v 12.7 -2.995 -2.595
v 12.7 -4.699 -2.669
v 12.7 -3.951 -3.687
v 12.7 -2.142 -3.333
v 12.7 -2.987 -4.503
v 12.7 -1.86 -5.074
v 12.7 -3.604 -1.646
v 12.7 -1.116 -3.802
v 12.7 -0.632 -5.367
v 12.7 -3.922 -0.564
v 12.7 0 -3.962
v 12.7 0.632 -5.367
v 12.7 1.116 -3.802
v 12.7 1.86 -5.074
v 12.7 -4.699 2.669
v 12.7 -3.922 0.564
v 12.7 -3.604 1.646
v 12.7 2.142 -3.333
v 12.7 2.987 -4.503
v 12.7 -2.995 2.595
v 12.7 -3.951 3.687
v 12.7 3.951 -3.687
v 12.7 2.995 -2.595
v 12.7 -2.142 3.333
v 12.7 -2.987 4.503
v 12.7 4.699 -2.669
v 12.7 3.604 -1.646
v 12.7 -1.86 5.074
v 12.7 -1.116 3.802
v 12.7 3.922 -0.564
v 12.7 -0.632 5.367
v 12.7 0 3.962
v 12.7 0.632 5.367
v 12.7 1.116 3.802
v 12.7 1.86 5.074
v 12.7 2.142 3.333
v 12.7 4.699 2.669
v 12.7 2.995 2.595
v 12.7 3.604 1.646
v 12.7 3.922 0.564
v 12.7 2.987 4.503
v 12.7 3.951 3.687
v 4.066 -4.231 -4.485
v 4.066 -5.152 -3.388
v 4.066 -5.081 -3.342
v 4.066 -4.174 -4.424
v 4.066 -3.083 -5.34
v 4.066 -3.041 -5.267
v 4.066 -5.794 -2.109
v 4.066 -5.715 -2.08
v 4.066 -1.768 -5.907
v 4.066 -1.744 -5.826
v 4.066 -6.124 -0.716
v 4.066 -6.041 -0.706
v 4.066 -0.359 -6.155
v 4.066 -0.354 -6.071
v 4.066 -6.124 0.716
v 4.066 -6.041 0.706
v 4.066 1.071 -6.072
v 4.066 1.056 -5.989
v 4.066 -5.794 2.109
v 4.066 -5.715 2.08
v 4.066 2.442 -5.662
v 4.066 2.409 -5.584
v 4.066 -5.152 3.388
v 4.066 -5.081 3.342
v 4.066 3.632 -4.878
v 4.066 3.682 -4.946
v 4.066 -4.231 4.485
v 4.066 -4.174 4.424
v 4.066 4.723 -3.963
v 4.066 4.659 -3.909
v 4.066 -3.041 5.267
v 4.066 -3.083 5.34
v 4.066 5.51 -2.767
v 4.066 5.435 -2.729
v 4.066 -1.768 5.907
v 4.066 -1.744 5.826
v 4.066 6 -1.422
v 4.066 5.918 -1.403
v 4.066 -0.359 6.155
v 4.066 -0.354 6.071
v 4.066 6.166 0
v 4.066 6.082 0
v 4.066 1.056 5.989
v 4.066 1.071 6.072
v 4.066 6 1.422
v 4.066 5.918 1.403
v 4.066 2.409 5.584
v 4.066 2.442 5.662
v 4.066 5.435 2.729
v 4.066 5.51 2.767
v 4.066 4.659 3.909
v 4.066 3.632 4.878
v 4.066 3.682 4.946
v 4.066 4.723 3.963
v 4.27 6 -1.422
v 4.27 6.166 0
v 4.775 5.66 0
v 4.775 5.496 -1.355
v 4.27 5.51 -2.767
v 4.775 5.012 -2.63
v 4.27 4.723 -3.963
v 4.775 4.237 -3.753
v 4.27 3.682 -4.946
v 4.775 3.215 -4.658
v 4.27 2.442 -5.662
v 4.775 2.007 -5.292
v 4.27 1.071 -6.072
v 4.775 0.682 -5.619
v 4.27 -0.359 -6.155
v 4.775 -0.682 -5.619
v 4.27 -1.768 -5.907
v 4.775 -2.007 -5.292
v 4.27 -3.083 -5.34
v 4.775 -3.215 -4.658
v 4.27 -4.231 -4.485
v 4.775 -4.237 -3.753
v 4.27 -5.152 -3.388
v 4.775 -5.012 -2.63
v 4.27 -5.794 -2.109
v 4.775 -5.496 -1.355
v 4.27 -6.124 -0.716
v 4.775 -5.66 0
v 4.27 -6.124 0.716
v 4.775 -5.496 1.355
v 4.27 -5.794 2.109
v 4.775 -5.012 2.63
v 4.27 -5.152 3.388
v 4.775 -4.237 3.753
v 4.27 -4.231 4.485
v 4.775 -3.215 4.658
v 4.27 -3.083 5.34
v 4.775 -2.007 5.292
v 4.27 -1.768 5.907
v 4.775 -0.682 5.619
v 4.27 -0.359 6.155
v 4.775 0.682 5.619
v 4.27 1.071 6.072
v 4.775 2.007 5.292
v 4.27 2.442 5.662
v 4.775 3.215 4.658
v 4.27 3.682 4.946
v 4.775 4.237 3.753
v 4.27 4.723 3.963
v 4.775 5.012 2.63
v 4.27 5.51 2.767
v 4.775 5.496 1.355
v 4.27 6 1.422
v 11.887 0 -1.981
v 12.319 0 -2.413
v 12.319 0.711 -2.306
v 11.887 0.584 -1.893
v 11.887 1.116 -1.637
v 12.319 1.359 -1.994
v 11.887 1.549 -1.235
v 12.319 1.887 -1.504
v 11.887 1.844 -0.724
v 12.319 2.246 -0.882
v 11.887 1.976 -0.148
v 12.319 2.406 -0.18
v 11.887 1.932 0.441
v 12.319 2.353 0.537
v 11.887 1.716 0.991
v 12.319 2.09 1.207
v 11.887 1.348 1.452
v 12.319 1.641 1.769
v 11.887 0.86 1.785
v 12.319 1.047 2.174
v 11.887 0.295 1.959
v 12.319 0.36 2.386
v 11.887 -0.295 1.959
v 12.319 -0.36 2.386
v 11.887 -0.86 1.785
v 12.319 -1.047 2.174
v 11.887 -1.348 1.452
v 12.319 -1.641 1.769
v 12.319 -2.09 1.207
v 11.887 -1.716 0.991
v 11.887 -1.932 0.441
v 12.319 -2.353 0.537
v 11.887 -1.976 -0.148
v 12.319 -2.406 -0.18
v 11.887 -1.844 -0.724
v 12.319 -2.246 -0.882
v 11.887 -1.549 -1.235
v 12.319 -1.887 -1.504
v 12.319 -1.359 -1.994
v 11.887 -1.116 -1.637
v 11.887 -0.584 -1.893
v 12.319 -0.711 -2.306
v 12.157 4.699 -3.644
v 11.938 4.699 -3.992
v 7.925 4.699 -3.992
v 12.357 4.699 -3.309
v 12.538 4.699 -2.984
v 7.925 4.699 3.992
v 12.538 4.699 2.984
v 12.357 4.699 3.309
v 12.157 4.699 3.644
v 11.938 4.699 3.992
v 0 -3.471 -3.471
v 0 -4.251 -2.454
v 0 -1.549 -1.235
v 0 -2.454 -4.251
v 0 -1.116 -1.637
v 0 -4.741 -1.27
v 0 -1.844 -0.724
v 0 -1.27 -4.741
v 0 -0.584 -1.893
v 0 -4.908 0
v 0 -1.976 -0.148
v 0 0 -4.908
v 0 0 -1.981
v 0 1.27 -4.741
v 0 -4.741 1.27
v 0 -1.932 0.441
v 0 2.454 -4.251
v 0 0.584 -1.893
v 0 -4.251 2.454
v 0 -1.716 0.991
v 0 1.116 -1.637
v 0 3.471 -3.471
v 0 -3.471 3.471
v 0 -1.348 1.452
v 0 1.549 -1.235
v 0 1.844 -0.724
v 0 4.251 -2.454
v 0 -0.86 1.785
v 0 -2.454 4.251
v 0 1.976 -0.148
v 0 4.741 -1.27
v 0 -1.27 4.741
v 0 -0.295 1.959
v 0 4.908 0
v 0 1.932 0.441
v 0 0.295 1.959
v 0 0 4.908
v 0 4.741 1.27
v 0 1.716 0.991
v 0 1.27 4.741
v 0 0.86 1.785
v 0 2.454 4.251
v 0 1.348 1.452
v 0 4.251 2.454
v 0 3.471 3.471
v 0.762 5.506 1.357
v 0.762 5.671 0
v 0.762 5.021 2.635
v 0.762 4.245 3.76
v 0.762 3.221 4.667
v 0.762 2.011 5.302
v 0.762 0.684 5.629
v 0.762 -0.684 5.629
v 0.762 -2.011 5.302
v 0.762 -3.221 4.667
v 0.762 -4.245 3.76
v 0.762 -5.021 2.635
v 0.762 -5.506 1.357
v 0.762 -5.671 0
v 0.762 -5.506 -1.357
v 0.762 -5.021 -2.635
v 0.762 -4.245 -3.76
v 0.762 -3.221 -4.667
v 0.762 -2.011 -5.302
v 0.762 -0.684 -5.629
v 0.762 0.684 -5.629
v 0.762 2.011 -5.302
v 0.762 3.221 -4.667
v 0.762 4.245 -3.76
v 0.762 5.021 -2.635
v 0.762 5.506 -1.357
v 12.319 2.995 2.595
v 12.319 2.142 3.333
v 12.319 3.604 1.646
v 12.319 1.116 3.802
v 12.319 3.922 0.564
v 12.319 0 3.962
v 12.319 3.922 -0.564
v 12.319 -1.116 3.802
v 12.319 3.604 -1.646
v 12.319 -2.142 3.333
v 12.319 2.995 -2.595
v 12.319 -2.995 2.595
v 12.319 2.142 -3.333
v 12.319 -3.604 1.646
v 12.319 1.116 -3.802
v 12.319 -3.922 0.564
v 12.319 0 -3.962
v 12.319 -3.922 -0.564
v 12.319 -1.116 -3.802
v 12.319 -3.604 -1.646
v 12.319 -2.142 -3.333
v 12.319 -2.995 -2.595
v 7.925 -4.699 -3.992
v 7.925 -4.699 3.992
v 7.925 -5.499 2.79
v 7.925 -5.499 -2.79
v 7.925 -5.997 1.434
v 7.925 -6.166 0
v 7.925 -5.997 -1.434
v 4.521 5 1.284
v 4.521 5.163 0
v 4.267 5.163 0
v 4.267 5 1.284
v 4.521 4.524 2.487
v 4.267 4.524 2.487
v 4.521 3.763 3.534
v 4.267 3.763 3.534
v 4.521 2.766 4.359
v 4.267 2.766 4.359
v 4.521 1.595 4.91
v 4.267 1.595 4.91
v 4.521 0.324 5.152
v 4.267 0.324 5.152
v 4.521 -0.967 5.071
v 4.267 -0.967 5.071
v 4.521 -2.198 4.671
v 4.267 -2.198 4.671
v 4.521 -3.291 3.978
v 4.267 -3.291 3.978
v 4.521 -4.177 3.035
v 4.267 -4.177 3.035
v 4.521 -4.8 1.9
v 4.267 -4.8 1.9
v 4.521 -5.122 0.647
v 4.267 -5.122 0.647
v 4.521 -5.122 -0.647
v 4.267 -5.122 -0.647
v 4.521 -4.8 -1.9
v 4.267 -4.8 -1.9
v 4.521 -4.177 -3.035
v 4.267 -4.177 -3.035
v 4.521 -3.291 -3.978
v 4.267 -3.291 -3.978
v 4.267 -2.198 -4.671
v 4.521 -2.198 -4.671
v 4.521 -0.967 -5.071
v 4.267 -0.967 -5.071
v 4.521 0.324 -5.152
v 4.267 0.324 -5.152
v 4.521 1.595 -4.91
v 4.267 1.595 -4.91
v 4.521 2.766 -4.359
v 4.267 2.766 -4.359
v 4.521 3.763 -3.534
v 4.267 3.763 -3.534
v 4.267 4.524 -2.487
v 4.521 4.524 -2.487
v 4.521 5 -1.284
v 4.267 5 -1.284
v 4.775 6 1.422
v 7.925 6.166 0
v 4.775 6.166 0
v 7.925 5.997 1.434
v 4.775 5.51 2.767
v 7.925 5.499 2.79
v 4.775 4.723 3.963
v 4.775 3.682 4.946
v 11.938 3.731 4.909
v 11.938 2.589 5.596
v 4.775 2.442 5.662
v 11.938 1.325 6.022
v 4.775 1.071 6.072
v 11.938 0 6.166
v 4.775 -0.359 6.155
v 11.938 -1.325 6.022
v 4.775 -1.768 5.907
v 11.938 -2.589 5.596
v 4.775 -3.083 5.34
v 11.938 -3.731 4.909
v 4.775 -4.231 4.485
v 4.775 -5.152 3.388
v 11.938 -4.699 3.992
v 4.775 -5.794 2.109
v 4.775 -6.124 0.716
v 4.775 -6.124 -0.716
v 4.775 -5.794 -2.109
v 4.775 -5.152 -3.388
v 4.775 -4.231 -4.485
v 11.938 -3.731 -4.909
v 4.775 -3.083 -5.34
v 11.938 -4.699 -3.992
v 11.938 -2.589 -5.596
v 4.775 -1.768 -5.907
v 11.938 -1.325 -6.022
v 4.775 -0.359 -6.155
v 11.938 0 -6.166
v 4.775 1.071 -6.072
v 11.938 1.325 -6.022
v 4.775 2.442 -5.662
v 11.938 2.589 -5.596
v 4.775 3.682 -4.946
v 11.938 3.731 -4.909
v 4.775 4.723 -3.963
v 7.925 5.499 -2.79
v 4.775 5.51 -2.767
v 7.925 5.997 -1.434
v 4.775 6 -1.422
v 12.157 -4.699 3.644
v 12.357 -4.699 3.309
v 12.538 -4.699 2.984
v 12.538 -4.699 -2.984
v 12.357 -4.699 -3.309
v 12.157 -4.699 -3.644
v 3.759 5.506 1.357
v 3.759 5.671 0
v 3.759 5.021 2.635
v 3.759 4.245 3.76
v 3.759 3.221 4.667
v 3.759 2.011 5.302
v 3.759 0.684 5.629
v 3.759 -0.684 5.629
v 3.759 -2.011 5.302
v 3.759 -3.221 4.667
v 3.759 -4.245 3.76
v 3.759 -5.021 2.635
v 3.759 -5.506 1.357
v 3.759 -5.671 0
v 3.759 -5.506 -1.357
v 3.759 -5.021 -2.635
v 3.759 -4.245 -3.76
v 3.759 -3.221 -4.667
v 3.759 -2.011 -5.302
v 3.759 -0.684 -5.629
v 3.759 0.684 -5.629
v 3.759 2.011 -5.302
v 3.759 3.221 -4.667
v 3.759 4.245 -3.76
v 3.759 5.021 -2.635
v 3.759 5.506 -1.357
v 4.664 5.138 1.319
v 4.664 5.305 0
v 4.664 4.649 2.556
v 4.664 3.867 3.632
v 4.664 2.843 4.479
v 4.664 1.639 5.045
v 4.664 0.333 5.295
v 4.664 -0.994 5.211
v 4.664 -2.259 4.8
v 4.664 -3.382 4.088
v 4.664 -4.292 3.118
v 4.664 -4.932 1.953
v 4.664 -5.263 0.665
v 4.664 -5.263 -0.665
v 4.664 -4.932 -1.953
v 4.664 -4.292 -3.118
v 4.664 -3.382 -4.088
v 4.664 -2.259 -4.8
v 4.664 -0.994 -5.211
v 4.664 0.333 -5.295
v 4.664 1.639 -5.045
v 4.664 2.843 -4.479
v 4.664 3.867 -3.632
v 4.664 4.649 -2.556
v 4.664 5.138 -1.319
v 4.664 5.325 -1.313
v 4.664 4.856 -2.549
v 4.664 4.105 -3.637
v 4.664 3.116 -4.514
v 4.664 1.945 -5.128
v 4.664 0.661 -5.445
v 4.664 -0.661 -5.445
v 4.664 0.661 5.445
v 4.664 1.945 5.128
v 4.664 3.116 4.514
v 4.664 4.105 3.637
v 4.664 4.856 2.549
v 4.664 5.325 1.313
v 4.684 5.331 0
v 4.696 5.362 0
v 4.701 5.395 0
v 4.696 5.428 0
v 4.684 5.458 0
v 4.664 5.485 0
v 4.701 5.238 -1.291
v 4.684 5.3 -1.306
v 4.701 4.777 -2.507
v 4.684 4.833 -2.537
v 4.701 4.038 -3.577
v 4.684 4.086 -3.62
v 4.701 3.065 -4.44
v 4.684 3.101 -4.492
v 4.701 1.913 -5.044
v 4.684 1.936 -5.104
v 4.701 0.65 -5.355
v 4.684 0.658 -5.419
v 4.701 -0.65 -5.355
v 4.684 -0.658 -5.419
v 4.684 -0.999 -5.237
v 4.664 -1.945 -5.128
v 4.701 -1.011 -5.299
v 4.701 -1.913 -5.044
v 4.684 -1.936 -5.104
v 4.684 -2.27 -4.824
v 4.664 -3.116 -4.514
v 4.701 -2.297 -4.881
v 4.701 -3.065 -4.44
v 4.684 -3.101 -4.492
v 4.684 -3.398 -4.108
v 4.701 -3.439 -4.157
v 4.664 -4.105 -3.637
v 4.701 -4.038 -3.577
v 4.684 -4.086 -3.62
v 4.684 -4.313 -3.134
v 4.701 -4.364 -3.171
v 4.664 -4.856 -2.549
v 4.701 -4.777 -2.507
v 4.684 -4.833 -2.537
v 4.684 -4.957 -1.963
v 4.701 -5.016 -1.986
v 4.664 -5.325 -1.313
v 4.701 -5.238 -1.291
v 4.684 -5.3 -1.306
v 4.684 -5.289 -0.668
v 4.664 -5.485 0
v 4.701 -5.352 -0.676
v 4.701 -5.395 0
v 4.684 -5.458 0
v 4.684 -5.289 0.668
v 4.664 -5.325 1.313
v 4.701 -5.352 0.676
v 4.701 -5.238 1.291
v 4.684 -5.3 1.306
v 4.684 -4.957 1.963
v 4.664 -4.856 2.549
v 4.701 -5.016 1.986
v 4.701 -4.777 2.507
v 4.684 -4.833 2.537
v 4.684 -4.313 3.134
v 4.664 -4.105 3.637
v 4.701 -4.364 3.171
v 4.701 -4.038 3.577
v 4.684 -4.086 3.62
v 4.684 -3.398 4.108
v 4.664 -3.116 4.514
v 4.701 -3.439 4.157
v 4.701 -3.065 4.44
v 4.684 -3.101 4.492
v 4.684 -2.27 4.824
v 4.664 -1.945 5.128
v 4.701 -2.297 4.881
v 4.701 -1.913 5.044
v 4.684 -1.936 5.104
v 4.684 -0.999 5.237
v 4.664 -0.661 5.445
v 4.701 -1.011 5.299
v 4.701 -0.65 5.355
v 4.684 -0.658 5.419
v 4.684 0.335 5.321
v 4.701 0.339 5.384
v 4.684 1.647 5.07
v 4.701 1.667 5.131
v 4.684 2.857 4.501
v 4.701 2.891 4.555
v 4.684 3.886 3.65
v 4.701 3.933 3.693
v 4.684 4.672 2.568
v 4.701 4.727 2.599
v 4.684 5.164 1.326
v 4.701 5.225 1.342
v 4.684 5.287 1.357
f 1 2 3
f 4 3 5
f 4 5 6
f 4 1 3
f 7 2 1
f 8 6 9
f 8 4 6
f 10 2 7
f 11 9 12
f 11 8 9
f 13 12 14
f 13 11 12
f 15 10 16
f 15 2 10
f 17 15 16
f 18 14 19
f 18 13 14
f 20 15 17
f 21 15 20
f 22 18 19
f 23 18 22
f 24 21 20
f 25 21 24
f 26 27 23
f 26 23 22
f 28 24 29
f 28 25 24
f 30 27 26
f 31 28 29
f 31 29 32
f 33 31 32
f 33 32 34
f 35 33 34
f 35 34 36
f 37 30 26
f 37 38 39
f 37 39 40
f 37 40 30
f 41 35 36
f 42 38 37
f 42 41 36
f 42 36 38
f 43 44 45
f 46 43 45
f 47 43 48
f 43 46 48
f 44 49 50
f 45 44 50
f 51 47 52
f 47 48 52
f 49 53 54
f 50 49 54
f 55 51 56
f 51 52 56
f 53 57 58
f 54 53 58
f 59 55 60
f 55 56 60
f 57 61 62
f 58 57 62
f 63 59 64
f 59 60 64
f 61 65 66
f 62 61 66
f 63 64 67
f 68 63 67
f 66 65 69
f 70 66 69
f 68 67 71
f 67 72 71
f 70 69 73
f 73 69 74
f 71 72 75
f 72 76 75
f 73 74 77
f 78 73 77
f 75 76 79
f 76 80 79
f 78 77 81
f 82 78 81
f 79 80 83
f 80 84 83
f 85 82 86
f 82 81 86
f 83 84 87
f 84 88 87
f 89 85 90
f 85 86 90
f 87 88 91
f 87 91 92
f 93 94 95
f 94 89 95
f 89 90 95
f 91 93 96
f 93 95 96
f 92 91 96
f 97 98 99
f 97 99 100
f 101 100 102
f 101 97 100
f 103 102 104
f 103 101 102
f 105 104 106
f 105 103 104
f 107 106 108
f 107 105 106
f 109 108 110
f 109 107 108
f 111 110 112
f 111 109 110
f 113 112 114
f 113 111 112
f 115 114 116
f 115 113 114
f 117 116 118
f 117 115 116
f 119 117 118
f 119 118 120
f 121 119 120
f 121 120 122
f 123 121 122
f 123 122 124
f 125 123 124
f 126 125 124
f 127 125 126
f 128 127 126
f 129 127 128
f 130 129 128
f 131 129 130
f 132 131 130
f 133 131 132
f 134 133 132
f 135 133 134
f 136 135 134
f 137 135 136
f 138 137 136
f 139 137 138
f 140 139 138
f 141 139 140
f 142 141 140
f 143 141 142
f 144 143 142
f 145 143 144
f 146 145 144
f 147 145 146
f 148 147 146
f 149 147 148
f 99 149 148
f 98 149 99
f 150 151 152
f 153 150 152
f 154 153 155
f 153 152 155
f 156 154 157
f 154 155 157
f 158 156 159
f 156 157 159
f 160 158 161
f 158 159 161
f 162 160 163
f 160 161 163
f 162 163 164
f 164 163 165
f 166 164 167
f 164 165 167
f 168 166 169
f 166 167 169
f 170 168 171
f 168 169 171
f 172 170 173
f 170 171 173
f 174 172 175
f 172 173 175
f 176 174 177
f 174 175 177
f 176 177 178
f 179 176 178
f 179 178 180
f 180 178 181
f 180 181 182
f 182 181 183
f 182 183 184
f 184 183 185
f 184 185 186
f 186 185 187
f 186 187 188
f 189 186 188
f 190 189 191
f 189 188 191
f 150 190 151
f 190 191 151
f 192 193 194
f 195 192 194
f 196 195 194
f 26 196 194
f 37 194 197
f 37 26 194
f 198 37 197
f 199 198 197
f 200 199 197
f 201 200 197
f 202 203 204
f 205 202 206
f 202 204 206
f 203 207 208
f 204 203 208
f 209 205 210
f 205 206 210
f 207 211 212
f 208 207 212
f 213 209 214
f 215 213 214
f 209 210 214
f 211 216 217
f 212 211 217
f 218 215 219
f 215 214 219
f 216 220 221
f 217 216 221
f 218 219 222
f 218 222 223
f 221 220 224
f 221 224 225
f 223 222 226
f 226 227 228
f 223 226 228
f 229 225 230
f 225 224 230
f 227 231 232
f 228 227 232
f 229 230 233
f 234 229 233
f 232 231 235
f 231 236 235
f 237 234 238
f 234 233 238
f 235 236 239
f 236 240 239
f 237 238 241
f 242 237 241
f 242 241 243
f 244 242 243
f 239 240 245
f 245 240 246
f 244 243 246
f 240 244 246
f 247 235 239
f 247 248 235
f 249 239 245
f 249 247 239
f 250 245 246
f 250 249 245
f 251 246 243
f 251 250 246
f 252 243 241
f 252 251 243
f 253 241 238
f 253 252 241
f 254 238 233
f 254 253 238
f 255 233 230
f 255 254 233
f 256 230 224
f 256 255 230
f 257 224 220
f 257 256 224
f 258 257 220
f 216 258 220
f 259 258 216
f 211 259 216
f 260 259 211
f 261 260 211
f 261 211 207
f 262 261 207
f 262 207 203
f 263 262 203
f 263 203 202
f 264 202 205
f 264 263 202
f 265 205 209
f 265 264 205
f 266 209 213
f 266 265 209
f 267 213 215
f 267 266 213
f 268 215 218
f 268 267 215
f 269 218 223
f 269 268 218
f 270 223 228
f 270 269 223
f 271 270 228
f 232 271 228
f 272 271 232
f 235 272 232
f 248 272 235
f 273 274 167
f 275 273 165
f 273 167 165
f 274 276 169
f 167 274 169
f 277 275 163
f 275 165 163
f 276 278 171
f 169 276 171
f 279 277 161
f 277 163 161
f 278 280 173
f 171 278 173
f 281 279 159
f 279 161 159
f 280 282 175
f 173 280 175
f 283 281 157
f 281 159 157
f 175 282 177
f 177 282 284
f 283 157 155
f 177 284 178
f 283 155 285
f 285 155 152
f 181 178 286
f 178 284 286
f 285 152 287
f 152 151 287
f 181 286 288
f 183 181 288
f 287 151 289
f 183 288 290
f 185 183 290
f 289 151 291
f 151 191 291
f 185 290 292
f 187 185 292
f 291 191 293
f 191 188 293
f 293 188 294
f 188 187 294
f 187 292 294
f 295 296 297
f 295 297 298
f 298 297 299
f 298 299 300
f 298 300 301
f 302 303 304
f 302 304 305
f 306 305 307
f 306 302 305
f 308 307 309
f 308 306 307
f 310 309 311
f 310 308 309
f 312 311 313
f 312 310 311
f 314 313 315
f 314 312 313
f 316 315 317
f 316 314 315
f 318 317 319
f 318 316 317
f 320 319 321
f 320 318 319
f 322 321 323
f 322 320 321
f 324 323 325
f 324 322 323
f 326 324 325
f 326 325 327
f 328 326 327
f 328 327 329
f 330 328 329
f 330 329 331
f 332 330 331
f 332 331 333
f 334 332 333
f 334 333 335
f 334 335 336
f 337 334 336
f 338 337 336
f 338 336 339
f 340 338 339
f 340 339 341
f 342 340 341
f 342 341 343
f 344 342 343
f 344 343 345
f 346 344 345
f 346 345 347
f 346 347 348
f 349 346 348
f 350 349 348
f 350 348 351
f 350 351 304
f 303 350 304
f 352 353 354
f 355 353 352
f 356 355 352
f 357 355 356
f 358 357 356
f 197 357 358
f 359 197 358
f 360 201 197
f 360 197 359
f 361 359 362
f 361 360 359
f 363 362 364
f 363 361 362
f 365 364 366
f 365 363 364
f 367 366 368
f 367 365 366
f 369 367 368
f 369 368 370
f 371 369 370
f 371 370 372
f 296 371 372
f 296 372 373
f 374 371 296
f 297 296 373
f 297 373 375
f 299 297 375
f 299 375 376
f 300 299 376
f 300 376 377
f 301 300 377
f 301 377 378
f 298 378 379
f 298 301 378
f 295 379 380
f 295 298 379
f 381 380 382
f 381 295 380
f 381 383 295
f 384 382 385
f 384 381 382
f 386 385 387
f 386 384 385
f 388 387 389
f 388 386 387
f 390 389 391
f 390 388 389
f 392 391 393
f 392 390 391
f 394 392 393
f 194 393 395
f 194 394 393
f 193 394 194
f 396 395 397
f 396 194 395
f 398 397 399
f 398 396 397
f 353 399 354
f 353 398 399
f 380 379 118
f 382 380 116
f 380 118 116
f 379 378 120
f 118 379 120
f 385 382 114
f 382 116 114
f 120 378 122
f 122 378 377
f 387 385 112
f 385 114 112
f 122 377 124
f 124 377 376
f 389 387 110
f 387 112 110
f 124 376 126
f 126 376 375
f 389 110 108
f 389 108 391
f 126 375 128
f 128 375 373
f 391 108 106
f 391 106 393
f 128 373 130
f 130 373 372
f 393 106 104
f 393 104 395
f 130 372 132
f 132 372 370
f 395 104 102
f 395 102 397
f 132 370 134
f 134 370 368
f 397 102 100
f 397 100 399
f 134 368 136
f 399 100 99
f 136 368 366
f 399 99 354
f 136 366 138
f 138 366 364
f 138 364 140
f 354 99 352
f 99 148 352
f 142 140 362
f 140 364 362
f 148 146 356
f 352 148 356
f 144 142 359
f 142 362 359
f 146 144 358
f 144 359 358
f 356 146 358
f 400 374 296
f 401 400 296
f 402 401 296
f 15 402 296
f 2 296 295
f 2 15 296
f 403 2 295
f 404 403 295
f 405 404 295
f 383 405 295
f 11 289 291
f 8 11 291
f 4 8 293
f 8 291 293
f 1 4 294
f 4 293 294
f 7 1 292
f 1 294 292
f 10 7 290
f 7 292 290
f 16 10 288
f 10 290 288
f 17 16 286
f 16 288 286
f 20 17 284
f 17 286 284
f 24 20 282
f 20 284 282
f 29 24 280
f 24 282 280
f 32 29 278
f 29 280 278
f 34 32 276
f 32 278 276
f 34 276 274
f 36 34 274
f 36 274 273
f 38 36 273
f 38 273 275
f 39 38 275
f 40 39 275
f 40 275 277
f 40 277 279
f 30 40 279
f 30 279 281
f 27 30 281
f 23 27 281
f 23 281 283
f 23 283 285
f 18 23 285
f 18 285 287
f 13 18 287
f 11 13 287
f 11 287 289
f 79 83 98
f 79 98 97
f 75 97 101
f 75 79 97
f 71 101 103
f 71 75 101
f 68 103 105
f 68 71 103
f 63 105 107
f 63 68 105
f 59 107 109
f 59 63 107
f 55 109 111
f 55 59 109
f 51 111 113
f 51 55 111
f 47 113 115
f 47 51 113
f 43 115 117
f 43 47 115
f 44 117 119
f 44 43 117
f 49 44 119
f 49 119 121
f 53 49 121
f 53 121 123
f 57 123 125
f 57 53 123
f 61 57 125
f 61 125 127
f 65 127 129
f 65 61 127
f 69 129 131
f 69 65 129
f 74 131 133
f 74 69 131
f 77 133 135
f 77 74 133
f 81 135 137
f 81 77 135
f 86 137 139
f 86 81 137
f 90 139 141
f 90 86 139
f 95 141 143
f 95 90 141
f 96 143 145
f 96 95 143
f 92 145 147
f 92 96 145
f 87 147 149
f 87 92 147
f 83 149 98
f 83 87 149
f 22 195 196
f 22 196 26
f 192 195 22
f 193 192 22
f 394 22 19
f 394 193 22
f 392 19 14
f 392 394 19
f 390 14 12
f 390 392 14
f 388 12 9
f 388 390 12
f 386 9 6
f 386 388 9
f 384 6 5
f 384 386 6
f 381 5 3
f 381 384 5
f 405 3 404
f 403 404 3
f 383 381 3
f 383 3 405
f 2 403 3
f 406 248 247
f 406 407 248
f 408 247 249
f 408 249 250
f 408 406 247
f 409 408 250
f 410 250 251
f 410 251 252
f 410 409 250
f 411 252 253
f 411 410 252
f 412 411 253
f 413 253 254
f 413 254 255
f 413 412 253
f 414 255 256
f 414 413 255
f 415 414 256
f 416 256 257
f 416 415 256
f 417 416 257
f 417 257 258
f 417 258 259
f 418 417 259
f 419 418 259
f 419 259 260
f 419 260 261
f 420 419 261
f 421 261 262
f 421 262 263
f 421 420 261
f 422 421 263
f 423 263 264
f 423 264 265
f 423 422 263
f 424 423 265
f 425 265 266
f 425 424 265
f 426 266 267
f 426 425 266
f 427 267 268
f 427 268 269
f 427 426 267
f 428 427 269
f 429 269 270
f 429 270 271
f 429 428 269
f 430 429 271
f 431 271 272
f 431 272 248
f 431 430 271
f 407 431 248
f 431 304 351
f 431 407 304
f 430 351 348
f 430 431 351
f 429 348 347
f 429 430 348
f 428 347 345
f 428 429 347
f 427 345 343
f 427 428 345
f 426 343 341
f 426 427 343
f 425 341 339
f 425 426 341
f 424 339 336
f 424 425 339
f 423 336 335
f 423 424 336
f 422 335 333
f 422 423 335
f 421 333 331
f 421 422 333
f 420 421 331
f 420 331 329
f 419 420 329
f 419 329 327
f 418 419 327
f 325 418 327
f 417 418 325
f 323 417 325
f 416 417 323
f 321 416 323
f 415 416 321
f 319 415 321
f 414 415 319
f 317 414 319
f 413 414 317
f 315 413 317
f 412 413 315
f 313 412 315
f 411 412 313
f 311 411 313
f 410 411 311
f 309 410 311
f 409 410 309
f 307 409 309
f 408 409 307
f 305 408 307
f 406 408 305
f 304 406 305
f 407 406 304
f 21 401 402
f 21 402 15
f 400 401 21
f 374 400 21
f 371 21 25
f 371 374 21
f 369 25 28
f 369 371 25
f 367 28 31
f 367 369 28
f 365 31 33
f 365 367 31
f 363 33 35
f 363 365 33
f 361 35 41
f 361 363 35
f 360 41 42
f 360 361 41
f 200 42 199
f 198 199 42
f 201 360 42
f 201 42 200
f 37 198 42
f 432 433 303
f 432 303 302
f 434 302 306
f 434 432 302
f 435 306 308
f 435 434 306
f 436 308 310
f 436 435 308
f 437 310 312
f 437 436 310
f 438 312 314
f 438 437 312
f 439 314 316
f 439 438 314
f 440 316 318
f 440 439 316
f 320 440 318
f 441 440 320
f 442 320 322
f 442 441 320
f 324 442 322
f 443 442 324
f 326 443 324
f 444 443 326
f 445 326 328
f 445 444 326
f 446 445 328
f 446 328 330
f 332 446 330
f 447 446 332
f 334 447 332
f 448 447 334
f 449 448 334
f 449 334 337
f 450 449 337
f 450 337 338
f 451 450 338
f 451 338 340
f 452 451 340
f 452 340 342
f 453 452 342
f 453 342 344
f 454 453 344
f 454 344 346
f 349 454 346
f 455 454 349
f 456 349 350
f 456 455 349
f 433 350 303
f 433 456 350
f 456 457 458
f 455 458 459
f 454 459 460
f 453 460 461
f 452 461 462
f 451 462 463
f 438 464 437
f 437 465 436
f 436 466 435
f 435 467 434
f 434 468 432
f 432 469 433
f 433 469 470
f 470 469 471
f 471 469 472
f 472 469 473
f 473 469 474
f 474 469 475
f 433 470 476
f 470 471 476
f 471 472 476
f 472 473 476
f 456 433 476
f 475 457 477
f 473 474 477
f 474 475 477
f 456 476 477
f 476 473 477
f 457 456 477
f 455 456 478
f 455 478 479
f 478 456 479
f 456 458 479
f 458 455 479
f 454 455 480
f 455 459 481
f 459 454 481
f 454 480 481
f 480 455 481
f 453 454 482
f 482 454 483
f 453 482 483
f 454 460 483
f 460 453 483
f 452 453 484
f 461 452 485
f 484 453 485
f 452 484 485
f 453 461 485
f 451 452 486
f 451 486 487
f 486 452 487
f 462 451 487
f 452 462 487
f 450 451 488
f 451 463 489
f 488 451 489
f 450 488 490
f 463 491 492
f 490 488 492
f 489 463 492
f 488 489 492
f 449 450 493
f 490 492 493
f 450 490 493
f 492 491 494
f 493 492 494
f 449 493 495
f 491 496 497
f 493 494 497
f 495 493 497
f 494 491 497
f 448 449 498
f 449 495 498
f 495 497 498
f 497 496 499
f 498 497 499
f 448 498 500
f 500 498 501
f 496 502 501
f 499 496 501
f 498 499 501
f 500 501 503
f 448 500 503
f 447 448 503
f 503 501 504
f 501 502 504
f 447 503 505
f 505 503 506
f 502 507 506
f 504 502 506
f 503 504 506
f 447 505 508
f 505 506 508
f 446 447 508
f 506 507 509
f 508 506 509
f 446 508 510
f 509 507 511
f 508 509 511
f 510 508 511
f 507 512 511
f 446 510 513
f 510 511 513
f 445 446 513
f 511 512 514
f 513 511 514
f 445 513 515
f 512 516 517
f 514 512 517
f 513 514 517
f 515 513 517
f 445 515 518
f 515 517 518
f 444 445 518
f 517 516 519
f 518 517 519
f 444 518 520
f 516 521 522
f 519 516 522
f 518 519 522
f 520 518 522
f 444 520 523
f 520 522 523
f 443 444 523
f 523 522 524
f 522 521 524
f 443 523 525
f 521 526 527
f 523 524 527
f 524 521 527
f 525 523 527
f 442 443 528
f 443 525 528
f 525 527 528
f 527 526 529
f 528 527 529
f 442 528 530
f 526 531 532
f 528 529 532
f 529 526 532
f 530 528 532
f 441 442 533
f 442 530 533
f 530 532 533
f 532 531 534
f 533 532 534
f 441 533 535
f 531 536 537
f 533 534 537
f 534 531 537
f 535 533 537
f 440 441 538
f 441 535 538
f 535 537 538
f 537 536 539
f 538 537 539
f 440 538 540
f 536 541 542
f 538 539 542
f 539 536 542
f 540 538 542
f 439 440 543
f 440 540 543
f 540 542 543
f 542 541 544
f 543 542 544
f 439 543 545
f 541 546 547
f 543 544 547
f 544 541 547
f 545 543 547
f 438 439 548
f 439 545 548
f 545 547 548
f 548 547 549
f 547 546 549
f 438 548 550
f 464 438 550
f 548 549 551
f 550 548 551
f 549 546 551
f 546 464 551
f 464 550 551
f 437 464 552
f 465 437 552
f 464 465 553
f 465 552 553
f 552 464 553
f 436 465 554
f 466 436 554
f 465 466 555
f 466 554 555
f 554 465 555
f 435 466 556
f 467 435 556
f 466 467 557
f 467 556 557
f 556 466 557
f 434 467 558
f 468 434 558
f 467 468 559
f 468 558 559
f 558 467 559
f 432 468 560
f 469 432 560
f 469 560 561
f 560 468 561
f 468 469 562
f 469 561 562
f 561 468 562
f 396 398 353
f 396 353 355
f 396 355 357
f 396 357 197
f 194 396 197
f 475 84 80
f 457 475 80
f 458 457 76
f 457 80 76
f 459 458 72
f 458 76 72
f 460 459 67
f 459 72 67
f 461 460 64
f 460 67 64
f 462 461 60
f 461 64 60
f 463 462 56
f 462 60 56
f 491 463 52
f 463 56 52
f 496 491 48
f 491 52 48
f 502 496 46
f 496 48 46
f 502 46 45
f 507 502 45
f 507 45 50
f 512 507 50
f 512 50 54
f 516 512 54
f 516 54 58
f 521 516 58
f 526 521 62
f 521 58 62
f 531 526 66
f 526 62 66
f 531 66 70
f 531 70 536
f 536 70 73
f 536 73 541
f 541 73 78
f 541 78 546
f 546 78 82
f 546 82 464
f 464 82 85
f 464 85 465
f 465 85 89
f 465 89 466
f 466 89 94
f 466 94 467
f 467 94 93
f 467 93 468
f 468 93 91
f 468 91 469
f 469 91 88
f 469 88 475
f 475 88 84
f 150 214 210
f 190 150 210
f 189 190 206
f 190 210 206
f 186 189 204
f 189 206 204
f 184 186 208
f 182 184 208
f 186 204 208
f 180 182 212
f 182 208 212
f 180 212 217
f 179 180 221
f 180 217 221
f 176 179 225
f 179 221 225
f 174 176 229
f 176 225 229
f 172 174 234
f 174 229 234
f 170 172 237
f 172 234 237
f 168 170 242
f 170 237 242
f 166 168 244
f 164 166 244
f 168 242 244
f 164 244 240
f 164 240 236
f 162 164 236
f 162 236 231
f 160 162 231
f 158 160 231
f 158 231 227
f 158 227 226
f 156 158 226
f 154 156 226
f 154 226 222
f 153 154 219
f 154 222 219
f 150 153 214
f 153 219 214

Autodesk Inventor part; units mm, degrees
sketch "Sketch_1" plane through (0, 0, 0) normal (0, 0, 1) x (1, 0, 0)
  line L0 (12.7, 0) -> (0, 0)
  line L1 (0, 0) -> (0, 4.9085)
  line L2 (0, 4.9085) -> (0.762, 5.6706)
  line L3 (0.762, 5.6706) -> (3.7592, 5.6706)
  line L4 (3.7592, 5.6706) -> (4.2672, 5.1626)
  line L5 (4.2672, 5.1626) -> (4.7752, 5.1626)
  line L6 (4.7752, 5.1626) -> (4.7752, 6.1659)
  line L7 (4.7752, 6.1659) -> (11.938, 6.1659)
  line L8 (11.938, 6.1659) -> (12.7, 5.4039)
  line L9 (12.7, 5.4039) -> (12.7, 0)
  line L10 (12.7, 0) -> (0, 0)
revolve "Revolution1" add sketch "Sketch_1" angle 360 about axis through (12.7, 0, 0) along (1, 0, 0)
sketch "Sketch2" plane through (12.7, 0, 0) normal (1, 0, 0) x (0, 0, -1)
  point P0 (0, 0)
hole "Hole1" at (12.7, 0, 0) direction (-1, 0, 0) diameter 7.9248 depth 0.381
sketch "Sketch3" plane through (12.319, 0, 0) normal (1, 0, 0) x (0, 0, -1)
  point P0 (0, 0)
hole "Hole2" at (12.319, 0, 0) direction (-1, 0, 0) diameter 3.9624 depth 12.319 countersink diameter 4.826 countersink angle 90 thread size "10-32 UNF" class "2B" standard "ANSI Unified Screw Threads"
sketch "Sketch_5" plane through (12.7, 0, 0) normal (1, 0, 0) x (0, 0, -1)
  line L0 (-24.6634, -12.3317) -> (24.6634, -12.3317)
  line L1 (24.6634, -12.3317) -> (24.6634, 12.3317)
  line L2 (24.6634, 12.3317) -> (-24.6634, 12.3317)
  line L3 (-24.6634, 12.3317) -> (-24.6634, -12.3317)
  line L4 (-12.3317, -4.699) -> (12.3317, -4.699)
  line L5 (12.3317, -4.699) -> (12.3317, 4.699)
  line L6 (12.3317, 4.699) -> (-12.3317, 4.699)
  line L7 (-12.3317, 4.699) -> (-12.3317, -4.699)
extrude "Extrusion1" cut sketch "Sketch_5" against normal blind 4.7752
sketch "Sketch_24" plane through (0, 0, 0) normal (0, 0, 1) x (1, 0, 0)
  line L0 (4.7752, 0) -> (4.2672, 0)
  line L1 (4.0665, 6.1659) -> (4.0665, 6.0817)
  line L2 (4.0665, 6.0817) -> (4.6636, 5.4846)
  arc A0 (4.6636, 5.305) -> (4.6636, 5.4846) centre (4.5738, 5.3948) ccw
  line L3 (4.6636, 5.305) -> (4.5212, 5.1626)
  line L4 (4.5212, 5.1626) -> (4.2672, 5.1626)
  line L5 (4.2672, 5.1626) -> (4.2672, 4.9085)
  line L6 (4.2672, 4.9085) -> (4.7752, 4.9085)
  line L7 (4.7752, 4.9085) -> (4.7752, 5.6603)
  line L8 (4.7752, 5.6603) -> (4.2697, 6.1659)
  line L9 (4.2697, 6.1659) -> (4.0665, 6.1659)
revolve "Revolution2" add sketch "Sketch_24" angle 360 about axis through (4.7752, 0, 0) along (1, 0, 0)
ref_plane "cut1_XY" through (12.7, 4.699, 0) normal (1, 0, 0) x (0, 0, -1)
ref_plane "cut1_YZ" through (12.7, 4.699, 0) normal (0, 0, -1) x (0, 1, 0)
ref_plane "cut1_ZX" through (12.7, 4.699, 0) normal (0, 1, 0) x (1, 0, 0)
ref_plane "cut2_XY" through (12.7, -4.699, 0) normal (1, 0, 0) x (0, 0, -1)
ref_plane "cut2_YZ" through (12.7, -4.699, 0) normal (0, 0, -1) x (0, 1, 0)
ref_plane "cut2_ZX" through (12.7, -4.699, 0) normal (0, 1, 0) x (1, 0, 0)
ref_plane "cutf1_XY" through (12.7, 0, 0) normal (0, 0, 1) x (1, 0, 0)
ref_plane "cutf1_YZ" through (12.7, 0, 0) normal (1, 0, 0) x (0, 1, 0)
ref_plane "cutf1_ZX" through (12.7, 0, 0) normal (0, 1, 0) x (0, 0, 1)
ref_plane "cutf2_XY" through (7.9248, 0, 0) normal (0, 0, 1) x (1, 0, 0)
ref_plane "cutf2_YZ" through (7.9248, 0, 0) normal (1, 0, 0) x (0, 1, 0)
ref_plane "cutf2_ZX" through (7.9248, 0, 0) normal (0, 1, 0) x (0, 0, 1)
ref_plane "lovra_XY" through (12.7, 0, 0) normal (1, 0, 0) x (0, 1, 0)
ref_plane "lovra_YZ" through (12.7, 0, 0) normal (0, 1, 0) x (0, 0, 1)
ref_plane "lovra_ZX" through (12.7, 0, 0) normal (0, 0, 1) x (1, 0, 0)
ref_plane "lovra1_XY" through (7.9248, 0, 0) normal (1, 0, 0) x (0, 0, -1)
ref_plane "lovra1_YZ" through (7.9248, 0, 0) normal (0, 0, -1) x (0, 1, 0)
ref_plane "lovra1_ZX" through (7.9248, 0, 0) normal (0, 1, 0) x (1, 0, 0)
ref_plane "lovra2_XY" through (7.9248, 4.699, 0) normal (1, 0, 0) x (0, 0, -1)
ref_plane "lovra2_YZ" through (7.9248, 4.699, 0) normal (0, 0, -1) x (0, 1, 0)
ref_plane "lovra2_ZX" through (7.9248, 4.699, 0) normal (0, 1, 0) x (1, 0, 0)
ref_plane "lovra21_XY" through (0, 0, 5.2705) normal (1, 0, 0) x (0, 0, -1)
ref_plane "lovra21_YZ" through (0, 0, 5.2705) normal (0, 0, -1) x (0, 1, 0)
ref_plane "lovra21_ZX" through (0, 0, 5.2705) normal (0, 1, 0) x (1, 0, 0)
ref_plane "lovra22_XY" through (0, 0, -5.2705) normal (1, 0, 0) x (0, 0, -1)
ref_plane "lovra22_YZ" through (0, 0, -5.2705) normal (0, 0, -1) x (0, 1, 0)
ref_plane "lovra22_ZX" through (0, 0, -5.2705) normal (0, 1, 0) x (1, 0, 0)
ref_plane "lovra3_XY" through (7.9248, -4.699, 0) normal (1, 0, 0) x (0, 0, -1)
ref_plane "lovra3_YZ" through (7.9248, -4.699, 0) normal (0, 0, -1) x (0, 1, 0)
ref_plane "lovra3_ZX" through (7.9248, -4.699, 0) normal (0, 1, 0) x (1, 0, 0)
ref_plane "olen_XY" through (12.7, 0, 0) normal (1, 0, 0) x (0, 0, -1)
ref_plane "olen_YZ" through (12.7, 0, 0) normal (0, 0, -1) x (0, 1, 0)
ref_plane "olen_ZX" through (12.7, 0, 0) normal (0, 1, 0) x (1, 0, 0)
ref_plane "to_mounting_bracket_XY" through (17.4752, 0, 0) normal (1, 0, 0) x (0, 0, -1)
ref_plane "to_mounting_bracket_YZ" through (17.4752, 0, 0) normal (0, 0, -1) x (0, 1, 0)
ref_plane "to_mounting_bracket_ZX" through (17.4752, 0, 0) normal (0, 1, 0) x (1, 0, 0)
ref_plane "to_nut_XY" through (0, 0, 0) normal (1, 0, 0) x (0, 0, -1)
ref_plane "to_nut_YZ" through (0, 0, 0) normal (0, 0, -1) x (0, 1, 0)
ref_plane "to_nut_ZX" through (0, 0, 0) normal (0, 1, 0) x (1, 0, 0)
ref_plane "to_pin_XY" through (23.8252, 0, 0) normal (0, 0, 1) x (1, 0, 0)
ref_plane "to_pin_YZ" through (23.8252, 0, 0) normal (1, 0, 0) x (0, 1, 0)
ref_plane "to_pin_ZX" through (23.8252, 0, 0) normal (0, 1, 0) x (0, 0, 1)
ref_plane "to_screw_XY" through (12.7, 0, 0) normal (0, 1, 0) x (1, 0, 0)
ref_plane "to_screw_YZ" through (12.7, 0, 0) normal (1, 0, 0) x (0, 0, -1)
ref_plane "to_screw_ZX" through (12.7, 0, 0) normal (0, 0, -1) x (0, 1, 0)
ref_plane "to_tube_XY" through (4.2672, 0, 0) normal (1, 0, 0) x (0, 0, -1)
ref_plane "to_tube_YZ" through (4.2672, 0, 0) normal (0, 0, -1) x (0, 1, 0)
ref_plane "to_tube_ZX" through (4.2672, 0, 0) normal (0, 1, 0) x (1, 0, 0)
properties part number "010000_rear_head"
